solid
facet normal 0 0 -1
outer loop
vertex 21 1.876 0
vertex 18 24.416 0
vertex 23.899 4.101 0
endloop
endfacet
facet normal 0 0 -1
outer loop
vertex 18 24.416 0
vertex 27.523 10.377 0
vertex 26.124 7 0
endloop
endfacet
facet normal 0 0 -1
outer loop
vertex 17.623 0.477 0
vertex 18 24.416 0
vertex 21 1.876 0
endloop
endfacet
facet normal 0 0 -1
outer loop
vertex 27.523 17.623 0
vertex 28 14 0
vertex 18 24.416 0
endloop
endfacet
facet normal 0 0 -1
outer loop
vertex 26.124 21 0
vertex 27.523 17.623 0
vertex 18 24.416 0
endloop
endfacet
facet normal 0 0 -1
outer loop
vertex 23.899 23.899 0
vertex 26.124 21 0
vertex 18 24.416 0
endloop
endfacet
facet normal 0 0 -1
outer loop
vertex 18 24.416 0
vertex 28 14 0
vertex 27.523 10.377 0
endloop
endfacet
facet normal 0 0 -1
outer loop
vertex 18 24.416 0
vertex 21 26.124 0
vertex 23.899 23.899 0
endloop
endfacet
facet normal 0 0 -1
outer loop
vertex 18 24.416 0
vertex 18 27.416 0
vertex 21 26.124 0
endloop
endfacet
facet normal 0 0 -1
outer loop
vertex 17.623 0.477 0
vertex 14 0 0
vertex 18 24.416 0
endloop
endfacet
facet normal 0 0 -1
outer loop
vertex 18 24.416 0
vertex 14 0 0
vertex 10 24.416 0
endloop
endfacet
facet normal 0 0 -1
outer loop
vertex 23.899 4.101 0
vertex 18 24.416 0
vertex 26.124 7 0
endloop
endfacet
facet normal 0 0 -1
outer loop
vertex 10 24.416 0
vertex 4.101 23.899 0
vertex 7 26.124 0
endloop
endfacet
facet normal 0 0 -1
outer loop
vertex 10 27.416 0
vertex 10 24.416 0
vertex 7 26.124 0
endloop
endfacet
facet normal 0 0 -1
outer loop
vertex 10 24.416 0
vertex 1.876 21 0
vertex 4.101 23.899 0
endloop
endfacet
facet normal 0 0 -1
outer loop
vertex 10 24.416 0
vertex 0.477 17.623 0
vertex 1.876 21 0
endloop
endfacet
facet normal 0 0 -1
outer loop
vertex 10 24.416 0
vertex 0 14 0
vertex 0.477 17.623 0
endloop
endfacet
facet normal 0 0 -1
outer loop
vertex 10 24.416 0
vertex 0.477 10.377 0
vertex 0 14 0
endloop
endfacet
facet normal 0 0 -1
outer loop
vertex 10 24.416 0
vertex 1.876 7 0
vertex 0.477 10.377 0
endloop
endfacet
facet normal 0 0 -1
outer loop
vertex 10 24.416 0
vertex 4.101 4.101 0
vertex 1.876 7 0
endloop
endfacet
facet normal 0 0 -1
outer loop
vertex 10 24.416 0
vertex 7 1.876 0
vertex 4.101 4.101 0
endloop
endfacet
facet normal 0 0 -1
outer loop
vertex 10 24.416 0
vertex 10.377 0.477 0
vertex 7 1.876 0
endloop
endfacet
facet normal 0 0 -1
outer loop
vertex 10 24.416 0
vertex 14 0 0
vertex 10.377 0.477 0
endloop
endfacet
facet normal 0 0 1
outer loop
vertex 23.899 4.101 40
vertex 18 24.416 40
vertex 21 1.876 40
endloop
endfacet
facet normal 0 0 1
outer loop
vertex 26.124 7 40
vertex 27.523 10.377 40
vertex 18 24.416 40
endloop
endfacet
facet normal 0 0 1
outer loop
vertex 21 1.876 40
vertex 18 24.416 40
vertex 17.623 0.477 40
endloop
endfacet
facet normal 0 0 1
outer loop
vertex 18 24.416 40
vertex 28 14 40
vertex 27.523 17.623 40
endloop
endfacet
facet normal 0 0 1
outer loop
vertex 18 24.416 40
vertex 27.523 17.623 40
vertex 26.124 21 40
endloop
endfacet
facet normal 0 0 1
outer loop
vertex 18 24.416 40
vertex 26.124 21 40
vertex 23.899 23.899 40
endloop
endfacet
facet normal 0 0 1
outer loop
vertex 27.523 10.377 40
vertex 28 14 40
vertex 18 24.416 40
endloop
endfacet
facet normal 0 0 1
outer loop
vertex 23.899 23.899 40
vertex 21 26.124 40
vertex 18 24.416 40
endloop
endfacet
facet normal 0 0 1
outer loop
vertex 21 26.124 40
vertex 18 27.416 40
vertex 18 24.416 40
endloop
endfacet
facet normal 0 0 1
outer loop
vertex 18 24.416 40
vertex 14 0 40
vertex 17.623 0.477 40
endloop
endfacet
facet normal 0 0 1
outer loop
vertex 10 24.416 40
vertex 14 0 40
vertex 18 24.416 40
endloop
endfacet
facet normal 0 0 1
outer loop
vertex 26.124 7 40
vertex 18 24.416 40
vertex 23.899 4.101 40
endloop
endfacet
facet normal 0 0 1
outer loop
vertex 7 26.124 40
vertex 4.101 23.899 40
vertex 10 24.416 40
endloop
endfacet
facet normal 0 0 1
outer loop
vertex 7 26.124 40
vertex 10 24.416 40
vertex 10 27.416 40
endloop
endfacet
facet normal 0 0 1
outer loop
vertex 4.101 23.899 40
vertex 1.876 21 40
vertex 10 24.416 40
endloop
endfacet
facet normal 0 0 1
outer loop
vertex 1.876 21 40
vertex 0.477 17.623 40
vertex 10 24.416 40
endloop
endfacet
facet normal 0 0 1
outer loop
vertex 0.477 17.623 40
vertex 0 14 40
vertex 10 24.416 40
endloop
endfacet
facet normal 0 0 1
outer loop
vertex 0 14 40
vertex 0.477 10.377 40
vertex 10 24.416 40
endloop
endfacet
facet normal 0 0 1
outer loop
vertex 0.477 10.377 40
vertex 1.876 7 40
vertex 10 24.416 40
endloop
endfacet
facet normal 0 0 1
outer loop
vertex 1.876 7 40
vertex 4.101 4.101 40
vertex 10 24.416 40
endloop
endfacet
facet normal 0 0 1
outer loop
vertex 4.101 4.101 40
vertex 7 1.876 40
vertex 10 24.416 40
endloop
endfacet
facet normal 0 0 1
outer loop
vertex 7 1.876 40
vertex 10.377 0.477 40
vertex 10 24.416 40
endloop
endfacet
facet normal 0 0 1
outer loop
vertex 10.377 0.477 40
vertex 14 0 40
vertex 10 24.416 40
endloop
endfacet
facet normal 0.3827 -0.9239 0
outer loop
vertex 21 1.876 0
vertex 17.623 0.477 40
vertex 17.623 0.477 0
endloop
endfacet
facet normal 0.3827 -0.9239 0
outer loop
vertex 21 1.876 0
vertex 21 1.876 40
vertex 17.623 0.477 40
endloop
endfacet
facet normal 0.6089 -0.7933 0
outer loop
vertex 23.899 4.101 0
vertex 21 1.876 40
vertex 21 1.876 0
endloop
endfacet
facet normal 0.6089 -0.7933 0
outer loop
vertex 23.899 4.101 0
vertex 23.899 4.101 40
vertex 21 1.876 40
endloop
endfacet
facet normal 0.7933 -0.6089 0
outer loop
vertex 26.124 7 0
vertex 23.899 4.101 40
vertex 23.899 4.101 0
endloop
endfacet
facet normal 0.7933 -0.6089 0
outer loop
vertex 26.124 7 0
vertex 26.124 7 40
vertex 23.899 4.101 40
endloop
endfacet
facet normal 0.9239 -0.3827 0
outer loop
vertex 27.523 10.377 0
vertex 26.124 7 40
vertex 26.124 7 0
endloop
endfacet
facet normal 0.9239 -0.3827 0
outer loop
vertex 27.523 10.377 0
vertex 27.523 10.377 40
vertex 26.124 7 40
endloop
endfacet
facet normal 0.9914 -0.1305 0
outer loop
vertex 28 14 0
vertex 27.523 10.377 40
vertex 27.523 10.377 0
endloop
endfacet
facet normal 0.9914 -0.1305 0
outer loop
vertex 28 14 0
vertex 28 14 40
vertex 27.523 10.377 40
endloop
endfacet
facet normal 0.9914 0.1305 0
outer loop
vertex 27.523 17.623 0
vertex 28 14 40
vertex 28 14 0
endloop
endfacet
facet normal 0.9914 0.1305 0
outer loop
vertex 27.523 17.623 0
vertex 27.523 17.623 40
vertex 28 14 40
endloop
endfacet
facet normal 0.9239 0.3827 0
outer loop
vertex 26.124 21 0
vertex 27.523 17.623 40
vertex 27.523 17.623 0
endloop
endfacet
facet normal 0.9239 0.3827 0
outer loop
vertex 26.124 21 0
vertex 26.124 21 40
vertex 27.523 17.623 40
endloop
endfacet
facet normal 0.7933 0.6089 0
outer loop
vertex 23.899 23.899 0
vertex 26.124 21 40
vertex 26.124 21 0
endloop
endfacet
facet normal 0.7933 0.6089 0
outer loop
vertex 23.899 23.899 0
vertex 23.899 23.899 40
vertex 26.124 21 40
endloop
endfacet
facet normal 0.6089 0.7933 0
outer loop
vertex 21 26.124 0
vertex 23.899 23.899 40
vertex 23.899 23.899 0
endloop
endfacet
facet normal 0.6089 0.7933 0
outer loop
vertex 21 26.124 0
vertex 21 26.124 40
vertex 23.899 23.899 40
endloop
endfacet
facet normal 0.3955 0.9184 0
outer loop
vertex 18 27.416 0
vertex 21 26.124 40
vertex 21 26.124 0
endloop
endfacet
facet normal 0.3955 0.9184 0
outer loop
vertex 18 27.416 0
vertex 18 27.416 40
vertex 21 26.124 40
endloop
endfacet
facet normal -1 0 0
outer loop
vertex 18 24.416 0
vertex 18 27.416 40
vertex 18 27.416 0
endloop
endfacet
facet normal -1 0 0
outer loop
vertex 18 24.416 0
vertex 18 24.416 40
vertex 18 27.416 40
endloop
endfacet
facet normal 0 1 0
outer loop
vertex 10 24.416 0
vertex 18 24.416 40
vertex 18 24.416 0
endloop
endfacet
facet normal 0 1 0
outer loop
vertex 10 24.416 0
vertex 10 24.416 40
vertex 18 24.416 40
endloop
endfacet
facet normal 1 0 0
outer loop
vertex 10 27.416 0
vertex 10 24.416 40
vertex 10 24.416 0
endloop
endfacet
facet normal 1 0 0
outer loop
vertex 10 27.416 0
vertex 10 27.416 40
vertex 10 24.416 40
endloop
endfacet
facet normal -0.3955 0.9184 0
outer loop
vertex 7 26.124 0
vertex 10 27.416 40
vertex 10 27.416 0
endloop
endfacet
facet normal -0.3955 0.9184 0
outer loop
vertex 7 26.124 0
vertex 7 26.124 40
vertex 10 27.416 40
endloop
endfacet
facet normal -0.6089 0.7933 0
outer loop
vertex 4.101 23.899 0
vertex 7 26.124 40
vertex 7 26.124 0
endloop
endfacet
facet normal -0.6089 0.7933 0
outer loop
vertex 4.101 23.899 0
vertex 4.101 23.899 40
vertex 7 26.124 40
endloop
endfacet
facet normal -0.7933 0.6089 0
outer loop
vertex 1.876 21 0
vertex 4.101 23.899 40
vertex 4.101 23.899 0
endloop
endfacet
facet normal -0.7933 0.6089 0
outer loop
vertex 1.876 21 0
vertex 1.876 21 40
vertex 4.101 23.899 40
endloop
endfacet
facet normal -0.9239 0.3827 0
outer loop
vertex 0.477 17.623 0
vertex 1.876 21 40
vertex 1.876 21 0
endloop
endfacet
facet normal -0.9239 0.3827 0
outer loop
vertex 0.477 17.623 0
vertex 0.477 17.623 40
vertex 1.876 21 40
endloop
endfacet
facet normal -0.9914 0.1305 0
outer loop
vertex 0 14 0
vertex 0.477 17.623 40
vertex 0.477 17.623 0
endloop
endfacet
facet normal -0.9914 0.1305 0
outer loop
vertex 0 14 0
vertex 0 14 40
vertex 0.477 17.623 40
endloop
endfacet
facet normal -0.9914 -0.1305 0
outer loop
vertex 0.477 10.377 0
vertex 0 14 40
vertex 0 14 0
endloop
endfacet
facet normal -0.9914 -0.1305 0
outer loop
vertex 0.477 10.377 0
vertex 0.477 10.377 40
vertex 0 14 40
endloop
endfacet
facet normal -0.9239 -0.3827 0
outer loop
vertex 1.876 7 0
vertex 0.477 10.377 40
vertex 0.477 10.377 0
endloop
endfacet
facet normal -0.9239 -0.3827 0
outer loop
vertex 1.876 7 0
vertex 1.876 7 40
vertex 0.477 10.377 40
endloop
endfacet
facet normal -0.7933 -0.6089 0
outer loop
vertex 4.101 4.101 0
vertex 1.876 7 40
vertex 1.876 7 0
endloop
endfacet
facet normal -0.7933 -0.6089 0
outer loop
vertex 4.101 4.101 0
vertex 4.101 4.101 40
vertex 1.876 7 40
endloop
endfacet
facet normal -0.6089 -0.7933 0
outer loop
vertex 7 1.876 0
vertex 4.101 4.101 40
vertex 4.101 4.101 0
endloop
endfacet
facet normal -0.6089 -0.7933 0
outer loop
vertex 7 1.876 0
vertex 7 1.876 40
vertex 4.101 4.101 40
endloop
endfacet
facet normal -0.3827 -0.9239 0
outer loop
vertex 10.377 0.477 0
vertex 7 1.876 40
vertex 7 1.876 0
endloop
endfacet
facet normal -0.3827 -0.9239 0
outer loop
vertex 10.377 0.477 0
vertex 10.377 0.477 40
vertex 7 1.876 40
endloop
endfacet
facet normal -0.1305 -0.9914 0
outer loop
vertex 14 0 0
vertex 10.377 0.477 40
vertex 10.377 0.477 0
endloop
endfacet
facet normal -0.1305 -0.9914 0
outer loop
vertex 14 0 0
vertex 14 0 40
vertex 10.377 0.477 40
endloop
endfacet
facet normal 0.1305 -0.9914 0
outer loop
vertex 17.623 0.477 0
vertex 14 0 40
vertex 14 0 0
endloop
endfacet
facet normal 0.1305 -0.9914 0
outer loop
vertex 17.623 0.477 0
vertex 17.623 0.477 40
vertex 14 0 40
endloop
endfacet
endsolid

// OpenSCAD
$fn = 32;

// ----------------------------------------------------------------------
// Keyway shaft: d28 shaft, key 8 x 3 mm
// ----------------------------------------------------------------------

// --- parameters (mm) ---
shaft_r = 14;             // shaft radius
key_w = 8;                // keyway width
key_d = 3;                // keyway depth below the surface line
plate_t = 40;             // shaft length, Z (extrusion height)

shaft_d = 2 * shaft_r;  // shaft diameter
circle_step = 15;  // polygon sampling step, degrees

profile = [[7, 26.124], [4.101, 23.899], [1.876, 21], [0.477, 17.623], [0, 14], [0.477, 10.377], [1.876, 7], [4.101, 4.101], [7, 1.876], [10.377, 0.477], [14, 0], [17.623, 0.477], [21, 1.876], [23.899, 4.101], [26.124, 7], [27.523, 10.377], [28, 14], [27.523, 17.623], [26.124, 21], [23.899, 23.899], [21, 26.124], [18, 27.416], [18, 24.416], [10, 24.416], [10, 27.416]];  // primary outline, 25 points, counter clockwise

// --- the one profile operation ---
linear_extrude(height = plate_t) polygon(points = profile);
